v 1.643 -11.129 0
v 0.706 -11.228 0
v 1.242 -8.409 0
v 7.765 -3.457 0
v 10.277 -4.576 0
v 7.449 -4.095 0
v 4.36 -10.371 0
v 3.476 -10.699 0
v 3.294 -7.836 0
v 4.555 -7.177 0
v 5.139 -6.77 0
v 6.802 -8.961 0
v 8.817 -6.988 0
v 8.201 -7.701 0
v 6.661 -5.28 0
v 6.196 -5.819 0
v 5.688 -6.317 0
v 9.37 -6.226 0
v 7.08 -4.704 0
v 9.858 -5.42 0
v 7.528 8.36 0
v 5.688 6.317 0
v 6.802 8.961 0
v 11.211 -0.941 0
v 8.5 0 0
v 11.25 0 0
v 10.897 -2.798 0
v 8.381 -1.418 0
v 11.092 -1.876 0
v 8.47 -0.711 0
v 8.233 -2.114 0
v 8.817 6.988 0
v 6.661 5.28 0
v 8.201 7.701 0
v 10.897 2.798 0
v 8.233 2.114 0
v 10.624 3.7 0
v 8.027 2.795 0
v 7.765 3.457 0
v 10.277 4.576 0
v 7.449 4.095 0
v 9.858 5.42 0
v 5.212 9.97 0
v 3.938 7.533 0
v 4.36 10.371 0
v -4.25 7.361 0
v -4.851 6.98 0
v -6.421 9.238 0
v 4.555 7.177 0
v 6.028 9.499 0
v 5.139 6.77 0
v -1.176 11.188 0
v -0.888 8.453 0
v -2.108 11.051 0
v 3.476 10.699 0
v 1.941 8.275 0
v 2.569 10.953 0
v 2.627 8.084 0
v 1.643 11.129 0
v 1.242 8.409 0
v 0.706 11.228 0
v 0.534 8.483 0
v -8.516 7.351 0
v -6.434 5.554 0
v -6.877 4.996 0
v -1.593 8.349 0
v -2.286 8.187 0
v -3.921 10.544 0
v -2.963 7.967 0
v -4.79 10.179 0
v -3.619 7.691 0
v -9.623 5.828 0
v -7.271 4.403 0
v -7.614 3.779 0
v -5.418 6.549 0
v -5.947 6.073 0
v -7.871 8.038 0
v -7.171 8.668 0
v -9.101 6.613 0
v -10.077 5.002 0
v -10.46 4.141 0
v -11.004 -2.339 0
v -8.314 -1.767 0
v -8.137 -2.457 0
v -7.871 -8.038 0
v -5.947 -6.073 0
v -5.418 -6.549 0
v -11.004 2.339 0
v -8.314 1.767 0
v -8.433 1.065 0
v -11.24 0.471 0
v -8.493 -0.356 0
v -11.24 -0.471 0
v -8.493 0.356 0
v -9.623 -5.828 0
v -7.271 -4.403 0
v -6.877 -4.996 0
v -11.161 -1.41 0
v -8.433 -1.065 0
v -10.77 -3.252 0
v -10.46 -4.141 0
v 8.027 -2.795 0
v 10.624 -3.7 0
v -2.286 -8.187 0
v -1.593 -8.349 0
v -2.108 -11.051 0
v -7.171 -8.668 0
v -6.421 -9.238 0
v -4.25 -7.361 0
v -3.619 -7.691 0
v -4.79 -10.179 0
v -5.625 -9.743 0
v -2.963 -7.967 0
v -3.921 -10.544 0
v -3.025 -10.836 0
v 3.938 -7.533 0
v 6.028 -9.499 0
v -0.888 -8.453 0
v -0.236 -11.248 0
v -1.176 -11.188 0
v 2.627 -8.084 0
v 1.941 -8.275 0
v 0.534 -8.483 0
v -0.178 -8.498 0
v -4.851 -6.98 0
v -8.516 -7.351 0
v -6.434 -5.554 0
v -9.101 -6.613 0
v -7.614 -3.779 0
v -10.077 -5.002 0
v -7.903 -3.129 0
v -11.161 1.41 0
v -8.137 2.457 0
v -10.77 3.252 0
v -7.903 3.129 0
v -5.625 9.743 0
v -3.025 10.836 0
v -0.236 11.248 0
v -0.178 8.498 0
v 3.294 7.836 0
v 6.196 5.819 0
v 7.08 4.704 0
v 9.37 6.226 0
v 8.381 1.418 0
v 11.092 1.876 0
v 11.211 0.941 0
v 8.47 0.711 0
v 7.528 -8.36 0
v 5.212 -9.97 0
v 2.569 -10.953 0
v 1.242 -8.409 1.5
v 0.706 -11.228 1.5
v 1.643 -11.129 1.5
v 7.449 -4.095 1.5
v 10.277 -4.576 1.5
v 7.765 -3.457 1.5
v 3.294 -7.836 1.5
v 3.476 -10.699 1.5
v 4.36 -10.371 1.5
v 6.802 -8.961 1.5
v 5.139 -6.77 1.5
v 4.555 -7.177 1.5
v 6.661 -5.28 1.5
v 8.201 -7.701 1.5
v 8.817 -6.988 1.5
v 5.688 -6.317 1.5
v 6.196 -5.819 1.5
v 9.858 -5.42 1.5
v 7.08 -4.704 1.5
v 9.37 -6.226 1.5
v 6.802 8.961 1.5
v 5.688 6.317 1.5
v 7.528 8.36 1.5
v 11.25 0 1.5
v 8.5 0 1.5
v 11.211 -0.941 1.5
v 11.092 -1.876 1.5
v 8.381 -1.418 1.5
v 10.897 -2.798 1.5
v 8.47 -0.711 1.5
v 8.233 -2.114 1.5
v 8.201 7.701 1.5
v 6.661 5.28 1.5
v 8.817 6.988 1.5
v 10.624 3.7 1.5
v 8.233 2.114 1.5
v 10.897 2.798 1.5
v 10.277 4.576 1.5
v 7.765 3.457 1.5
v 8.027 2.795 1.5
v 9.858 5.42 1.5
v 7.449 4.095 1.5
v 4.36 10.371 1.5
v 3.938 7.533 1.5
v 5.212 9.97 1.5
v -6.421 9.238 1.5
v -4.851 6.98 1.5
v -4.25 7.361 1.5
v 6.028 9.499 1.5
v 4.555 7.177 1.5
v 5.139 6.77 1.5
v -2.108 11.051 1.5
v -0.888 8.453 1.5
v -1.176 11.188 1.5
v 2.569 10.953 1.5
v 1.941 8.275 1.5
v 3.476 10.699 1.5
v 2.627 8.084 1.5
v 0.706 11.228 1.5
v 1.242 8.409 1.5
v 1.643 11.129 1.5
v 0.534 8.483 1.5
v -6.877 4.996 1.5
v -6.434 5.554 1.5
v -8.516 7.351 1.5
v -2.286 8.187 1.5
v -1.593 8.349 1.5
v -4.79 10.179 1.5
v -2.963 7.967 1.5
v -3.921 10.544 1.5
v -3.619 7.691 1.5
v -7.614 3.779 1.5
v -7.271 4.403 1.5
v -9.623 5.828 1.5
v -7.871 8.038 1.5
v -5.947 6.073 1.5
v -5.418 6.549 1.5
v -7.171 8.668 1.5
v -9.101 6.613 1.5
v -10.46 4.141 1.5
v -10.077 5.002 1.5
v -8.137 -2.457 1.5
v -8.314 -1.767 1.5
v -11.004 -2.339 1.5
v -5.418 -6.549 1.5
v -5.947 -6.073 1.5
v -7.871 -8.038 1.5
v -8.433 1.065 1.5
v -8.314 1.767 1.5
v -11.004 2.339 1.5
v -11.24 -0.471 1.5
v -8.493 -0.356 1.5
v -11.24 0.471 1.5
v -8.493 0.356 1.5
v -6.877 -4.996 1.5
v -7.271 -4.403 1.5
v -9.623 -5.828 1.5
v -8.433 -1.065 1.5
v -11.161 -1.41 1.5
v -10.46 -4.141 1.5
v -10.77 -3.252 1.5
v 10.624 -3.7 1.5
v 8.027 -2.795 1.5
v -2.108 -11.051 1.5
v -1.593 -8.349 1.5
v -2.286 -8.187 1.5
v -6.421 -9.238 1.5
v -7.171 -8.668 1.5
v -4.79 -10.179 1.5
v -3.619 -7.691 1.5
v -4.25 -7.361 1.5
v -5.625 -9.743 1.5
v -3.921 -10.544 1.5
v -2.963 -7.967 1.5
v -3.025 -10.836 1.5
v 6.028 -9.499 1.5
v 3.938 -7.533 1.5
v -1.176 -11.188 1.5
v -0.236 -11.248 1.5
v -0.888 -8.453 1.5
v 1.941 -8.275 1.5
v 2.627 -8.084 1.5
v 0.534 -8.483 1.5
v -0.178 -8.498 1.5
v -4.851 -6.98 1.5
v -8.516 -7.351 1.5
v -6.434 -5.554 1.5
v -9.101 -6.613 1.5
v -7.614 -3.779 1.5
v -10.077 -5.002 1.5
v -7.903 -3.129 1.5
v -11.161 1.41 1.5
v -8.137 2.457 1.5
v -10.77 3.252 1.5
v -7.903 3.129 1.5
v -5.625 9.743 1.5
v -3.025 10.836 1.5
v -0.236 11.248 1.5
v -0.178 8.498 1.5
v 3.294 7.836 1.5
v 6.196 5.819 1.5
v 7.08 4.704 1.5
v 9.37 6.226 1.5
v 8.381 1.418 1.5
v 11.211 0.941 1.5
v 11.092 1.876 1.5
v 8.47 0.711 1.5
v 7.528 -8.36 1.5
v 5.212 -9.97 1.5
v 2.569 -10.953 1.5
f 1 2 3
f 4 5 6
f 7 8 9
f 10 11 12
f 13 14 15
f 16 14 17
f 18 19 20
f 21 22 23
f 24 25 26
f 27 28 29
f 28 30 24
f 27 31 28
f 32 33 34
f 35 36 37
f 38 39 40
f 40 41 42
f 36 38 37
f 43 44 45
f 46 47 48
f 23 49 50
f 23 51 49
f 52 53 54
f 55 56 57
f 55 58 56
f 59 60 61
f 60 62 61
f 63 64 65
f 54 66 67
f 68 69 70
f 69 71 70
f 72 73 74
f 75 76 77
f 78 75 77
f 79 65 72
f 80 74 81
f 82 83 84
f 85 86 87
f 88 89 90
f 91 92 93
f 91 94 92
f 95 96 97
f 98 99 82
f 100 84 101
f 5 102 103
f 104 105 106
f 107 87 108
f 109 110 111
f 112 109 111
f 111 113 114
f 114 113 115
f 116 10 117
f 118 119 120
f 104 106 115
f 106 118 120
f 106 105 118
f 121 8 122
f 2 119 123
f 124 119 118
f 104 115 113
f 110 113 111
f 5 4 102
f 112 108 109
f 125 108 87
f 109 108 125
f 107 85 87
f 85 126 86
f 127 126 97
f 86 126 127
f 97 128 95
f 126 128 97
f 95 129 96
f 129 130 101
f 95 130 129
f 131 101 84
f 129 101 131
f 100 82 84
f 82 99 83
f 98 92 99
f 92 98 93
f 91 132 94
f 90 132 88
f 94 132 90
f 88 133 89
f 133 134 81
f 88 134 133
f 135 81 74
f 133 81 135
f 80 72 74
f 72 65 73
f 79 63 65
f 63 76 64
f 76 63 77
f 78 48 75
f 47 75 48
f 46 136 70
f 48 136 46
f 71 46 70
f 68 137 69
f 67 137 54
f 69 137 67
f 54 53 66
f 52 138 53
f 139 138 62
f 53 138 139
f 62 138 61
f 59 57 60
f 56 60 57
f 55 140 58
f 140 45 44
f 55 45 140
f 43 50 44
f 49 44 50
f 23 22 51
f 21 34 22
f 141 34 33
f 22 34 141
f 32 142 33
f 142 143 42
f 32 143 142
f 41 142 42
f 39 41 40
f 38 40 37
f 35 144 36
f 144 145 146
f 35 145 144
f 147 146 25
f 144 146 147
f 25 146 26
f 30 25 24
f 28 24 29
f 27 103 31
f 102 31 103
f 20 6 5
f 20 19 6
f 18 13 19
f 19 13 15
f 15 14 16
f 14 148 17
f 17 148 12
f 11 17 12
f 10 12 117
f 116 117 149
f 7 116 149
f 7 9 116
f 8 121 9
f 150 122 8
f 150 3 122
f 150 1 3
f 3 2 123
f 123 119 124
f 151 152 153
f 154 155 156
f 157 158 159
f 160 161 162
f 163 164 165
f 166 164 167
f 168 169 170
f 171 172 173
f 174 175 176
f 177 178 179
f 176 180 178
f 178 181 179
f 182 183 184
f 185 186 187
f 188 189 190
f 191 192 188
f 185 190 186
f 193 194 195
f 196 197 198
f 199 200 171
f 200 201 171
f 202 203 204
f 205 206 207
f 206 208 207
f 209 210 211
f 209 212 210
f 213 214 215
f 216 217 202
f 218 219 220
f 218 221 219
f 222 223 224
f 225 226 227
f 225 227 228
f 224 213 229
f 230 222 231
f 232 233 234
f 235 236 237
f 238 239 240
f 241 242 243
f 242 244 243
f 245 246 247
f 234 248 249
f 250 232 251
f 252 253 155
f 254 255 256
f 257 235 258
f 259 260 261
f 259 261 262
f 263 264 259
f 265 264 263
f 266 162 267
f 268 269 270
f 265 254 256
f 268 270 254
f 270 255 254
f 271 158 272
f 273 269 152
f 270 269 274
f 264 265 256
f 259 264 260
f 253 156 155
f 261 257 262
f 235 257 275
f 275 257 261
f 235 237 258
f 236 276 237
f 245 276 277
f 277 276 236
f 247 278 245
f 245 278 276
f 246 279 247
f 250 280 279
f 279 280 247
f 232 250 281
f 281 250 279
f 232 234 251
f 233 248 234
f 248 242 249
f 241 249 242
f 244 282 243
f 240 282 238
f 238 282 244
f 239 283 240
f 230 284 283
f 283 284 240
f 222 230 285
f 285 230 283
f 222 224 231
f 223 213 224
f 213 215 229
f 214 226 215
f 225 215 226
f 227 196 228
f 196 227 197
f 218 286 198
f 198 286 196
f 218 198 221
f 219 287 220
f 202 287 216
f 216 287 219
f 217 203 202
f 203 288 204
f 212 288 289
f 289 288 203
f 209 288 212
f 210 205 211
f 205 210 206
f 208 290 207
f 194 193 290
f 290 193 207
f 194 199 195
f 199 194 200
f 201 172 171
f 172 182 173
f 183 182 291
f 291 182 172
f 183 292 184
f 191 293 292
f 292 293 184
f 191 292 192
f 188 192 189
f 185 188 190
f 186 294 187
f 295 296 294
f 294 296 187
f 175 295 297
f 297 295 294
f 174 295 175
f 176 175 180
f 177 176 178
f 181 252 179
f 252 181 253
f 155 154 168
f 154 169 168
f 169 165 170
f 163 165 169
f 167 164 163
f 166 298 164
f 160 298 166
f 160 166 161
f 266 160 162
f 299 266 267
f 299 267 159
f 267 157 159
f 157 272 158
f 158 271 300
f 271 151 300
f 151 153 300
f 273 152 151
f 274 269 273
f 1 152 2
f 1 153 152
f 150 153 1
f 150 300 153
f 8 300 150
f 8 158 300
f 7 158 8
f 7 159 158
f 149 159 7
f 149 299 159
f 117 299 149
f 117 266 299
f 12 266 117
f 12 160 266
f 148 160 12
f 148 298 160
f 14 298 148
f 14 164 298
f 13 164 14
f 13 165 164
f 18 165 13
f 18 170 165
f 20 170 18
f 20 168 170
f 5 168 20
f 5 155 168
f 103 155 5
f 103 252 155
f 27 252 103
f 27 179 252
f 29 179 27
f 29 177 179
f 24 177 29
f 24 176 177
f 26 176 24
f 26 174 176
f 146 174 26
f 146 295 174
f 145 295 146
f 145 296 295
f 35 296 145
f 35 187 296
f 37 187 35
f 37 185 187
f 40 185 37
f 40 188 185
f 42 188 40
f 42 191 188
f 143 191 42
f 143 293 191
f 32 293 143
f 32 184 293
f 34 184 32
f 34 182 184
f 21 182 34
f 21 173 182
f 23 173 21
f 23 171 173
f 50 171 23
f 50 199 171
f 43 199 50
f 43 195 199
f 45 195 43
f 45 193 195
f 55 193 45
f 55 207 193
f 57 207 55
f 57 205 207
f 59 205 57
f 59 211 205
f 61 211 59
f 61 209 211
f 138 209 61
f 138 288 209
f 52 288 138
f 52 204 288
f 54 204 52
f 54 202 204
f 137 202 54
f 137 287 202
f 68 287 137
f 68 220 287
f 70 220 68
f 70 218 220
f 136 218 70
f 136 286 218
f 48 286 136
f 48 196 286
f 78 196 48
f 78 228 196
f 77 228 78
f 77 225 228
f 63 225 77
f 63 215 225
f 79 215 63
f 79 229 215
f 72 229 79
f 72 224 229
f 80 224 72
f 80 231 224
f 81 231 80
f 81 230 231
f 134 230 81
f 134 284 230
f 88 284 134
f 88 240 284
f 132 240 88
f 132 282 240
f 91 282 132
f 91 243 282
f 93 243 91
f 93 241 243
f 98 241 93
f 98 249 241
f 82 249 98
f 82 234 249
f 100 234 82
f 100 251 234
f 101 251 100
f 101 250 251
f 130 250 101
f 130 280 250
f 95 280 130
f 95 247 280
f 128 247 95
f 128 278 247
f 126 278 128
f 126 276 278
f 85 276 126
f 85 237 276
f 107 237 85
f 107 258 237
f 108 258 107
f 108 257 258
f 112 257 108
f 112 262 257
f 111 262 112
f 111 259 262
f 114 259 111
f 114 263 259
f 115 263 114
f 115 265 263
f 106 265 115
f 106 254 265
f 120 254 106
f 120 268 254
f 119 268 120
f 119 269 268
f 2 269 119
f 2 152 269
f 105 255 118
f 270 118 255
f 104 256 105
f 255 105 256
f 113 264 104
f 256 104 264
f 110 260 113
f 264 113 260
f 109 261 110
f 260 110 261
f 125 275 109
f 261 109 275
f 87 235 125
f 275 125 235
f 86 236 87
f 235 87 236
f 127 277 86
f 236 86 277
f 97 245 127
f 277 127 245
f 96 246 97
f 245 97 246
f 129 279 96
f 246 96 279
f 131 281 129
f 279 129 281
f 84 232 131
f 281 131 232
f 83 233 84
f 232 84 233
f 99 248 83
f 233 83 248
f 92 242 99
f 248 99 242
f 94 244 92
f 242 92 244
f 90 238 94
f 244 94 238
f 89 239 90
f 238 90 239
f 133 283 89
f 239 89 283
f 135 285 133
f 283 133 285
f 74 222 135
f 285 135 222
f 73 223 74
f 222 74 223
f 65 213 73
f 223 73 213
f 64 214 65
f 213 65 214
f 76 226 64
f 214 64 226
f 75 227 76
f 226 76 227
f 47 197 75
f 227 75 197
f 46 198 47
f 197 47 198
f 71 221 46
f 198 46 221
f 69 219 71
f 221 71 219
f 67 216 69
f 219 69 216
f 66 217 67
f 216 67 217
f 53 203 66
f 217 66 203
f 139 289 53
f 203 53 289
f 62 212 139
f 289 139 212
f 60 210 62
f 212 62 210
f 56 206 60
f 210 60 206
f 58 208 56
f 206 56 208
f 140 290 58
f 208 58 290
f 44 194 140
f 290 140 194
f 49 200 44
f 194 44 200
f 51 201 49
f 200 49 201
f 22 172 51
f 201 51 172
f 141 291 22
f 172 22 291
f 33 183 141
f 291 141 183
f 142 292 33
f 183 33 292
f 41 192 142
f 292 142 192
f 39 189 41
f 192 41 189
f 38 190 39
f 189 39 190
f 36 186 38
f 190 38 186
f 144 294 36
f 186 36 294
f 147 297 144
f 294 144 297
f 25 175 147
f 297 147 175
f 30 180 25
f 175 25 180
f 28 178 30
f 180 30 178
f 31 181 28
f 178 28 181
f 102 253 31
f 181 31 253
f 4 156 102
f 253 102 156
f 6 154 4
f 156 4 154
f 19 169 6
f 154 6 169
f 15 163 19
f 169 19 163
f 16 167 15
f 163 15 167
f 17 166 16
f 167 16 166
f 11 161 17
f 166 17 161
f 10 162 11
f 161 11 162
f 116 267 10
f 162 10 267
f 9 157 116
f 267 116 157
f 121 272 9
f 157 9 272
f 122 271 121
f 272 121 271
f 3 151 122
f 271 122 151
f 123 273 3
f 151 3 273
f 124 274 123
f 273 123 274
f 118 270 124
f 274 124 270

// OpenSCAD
$fn = 75;

inside_d = 17/2;
outside_d = 22.5/2;
thickness = 1.5;

linear_extrude(height=thickness)
difference() {
    circle(outside_d);
    circle(inside_d);
};
